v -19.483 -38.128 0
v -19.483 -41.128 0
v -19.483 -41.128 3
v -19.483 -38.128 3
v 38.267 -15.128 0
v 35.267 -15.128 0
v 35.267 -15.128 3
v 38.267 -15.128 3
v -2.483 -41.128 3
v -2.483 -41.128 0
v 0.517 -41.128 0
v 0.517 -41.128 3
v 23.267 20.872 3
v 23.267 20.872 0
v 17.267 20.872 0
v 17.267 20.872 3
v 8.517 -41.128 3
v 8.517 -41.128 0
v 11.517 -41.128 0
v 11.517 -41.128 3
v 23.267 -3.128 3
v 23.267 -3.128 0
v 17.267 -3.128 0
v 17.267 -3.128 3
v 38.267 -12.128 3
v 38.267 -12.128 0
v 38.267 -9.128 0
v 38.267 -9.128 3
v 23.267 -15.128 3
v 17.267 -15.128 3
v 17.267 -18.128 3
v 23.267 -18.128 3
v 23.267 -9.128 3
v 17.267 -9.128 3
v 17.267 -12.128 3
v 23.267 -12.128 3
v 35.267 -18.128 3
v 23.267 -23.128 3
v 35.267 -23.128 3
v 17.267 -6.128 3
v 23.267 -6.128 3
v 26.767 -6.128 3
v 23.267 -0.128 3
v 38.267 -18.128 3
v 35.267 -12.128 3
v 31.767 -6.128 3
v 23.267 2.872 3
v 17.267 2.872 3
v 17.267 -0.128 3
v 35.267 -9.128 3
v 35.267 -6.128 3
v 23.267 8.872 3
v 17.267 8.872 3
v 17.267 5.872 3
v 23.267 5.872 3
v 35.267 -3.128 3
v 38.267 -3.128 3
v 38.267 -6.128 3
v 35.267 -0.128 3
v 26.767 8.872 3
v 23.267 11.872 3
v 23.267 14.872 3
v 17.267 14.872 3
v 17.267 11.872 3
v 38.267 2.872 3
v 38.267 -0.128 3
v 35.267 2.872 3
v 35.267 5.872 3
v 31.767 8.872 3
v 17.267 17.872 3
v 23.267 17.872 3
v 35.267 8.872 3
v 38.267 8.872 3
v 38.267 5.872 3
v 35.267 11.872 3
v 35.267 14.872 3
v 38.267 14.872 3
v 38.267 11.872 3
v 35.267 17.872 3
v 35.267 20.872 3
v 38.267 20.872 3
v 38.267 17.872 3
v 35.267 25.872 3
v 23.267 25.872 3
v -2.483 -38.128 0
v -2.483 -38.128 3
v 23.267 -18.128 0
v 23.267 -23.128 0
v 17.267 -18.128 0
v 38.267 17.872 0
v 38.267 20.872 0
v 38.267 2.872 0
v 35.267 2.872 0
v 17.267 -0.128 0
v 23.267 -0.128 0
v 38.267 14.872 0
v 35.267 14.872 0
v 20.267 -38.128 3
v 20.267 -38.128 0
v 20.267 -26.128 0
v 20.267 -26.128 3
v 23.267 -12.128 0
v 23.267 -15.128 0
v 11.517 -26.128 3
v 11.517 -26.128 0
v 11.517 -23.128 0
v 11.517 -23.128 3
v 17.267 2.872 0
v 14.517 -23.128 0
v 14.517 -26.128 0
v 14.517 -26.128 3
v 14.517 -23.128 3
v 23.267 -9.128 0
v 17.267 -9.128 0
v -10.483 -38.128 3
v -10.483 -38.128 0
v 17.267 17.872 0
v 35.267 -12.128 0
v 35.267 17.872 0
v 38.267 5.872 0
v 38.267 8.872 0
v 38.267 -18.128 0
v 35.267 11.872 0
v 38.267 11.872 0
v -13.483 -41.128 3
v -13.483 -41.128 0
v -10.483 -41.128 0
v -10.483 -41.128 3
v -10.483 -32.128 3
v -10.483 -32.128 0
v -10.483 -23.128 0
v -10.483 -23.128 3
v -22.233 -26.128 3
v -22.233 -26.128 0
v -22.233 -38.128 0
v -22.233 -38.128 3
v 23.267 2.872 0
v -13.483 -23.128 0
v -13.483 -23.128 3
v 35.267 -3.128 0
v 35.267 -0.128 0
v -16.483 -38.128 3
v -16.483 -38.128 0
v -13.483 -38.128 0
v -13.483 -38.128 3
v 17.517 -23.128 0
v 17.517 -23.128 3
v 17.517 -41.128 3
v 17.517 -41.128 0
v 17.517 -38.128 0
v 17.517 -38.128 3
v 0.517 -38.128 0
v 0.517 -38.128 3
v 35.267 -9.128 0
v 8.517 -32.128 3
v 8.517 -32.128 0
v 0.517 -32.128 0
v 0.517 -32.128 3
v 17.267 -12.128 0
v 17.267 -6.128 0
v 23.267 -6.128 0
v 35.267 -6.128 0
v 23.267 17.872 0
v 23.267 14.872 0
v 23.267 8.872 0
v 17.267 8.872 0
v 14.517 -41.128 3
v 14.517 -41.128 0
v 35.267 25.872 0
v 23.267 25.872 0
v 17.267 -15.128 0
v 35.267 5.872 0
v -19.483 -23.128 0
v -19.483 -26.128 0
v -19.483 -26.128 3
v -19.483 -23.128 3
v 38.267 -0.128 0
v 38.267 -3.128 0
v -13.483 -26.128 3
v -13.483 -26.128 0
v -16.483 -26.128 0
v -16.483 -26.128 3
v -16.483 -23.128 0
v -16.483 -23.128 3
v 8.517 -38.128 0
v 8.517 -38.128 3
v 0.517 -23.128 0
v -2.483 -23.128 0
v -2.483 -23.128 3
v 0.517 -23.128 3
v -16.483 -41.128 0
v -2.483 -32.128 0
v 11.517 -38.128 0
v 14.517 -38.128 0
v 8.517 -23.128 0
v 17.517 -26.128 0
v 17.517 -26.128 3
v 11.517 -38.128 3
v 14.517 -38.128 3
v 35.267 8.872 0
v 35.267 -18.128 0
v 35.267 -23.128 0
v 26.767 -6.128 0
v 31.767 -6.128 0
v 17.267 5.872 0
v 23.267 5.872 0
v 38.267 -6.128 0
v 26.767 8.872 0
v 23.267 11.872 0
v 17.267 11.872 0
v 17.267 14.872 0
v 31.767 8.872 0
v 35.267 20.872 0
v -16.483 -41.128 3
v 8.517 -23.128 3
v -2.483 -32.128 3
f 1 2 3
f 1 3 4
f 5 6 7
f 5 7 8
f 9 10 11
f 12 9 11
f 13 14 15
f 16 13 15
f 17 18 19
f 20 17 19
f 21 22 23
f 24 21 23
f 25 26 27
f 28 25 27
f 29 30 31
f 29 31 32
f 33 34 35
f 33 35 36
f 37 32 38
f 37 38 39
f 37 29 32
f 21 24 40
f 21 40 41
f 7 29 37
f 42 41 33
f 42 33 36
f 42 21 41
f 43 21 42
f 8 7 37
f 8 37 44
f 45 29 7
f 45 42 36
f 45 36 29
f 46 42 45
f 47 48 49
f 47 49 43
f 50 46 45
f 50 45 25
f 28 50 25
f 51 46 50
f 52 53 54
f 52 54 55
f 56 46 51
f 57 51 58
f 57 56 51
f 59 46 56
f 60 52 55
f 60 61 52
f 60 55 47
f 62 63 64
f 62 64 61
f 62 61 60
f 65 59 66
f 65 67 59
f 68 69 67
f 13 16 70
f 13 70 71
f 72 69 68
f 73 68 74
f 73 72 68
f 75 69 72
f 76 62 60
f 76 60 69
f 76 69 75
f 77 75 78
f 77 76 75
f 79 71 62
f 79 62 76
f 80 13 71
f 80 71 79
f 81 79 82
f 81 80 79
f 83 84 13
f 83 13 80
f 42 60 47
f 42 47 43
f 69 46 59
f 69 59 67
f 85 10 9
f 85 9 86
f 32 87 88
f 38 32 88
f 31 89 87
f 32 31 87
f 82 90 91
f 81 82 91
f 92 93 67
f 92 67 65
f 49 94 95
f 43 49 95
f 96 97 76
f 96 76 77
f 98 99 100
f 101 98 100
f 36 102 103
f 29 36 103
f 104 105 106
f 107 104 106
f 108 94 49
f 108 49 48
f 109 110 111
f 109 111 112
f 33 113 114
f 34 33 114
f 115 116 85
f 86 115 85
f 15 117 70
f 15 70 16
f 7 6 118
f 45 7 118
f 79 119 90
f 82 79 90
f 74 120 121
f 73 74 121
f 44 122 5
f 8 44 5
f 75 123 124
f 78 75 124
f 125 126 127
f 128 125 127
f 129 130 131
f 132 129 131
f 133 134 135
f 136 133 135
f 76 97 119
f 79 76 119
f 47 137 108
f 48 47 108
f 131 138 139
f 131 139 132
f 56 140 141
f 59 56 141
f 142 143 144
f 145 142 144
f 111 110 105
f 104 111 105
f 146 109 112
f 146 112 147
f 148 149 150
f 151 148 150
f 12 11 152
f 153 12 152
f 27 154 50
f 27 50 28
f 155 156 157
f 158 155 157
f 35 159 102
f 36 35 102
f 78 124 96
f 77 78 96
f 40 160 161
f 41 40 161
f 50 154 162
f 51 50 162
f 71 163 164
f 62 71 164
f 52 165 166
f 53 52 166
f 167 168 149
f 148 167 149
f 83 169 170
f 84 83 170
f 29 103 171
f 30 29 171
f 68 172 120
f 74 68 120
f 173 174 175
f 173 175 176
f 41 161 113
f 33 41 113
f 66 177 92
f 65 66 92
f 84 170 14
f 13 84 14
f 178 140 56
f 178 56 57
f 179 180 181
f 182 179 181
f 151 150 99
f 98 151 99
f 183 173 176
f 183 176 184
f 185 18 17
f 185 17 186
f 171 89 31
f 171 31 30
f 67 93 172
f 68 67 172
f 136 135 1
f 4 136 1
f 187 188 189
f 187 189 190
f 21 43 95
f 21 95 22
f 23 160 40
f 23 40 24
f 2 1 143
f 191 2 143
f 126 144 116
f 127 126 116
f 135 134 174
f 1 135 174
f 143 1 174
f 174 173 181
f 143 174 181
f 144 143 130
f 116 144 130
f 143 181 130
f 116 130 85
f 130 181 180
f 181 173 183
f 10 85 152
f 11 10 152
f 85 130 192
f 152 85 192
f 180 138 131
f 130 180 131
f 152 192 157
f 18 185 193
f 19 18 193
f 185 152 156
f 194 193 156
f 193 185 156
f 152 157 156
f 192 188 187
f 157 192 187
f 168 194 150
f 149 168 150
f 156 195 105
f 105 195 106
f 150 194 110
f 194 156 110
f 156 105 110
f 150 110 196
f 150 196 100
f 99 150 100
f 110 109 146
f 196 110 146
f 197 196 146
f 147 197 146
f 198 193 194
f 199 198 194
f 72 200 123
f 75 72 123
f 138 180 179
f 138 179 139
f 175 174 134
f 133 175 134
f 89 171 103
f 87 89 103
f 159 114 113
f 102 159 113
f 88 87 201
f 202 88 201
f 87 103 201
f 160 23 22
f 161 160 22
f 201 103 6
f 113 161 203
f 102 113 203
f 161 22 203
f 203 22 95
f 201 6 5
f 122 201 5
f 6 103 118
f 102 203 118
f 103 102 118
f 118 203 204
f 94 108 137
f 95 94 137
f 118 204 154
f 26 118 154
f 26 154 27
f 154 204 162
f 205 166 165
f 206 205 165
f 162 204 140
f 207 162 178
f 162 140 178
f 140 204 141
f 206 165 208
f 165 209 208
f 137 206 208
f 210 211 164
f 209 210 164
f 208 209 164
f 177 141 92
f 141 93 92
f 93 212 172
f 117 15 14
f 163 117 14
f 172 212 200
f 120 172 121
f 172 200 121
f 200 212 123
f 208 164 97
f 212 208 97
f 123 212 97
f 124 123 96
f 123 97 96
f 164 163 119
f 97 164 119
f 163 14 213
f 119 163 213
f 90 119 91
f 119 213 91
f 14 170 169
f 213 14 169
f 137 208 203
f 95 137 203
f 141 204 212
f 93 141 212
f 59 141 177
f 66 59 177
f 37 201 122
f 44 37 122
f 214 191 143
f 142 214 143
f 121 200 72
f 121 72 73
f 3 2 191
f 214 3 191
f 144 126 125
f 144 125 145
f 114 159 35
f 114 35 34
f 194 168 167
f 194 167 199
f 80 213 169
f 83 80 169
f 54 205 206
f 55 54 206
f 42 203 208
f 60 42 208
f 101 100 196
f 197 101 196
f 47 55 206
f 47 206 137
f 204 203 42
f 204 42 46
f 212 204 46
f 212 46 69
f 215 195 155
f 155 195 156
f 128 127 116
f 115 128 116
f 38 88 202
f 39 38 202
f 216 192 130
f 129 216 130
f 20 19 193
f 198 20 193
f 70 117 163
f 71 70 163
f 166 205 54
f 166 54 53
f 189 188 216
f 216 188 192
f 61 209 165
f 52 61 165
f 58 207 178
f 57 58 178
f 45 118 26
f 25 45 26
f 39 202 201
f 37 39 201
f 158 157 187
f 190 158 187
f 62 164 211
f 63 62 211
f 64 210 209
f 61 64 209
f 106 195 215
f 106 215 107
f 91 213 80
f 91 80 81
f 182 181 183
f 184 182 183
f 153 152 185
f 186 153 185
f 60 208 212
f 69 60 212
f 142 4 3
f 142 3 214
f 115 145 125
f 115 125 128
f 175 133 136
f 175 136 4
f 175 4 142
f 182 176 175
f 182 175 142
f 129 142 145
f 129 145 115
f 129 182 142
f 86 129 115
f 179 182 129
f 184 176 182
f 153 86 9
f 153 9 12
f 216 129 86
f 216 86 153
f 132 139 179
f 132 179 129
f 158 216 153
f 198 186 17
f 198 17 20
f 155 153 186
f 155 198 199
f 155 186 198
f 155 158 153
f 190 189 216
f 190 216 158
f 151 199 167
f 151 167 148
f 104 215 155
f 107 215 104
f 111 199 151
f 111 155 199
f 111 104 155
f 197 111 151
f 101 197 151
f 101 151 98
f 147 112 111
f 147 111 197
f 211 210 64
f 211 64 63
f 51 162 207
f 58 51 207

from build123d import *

# Parameters (mm, degrees)
F0_W     = 3
F0_H     = 3
F1_DEPTH = 3
F2_W     = 5
F2_H     = 15
F3_DEPTH = 25


# Not quite as in the source:
# - a feature names something its author has since deleted; it is built from what else it names


with BuildPart() as f1:
    # F0 (on Top) → F1 (new body)
    with BuildSketch(Plane.XY):
        Polygon((20.2673766234, -38.1281147589), (20.2673766234, -26.1281147589), (17.5173766234, -26.1281147589), (17.5173766234, -29.1281147589), (14.5173766234, -29.1281147589), (14.5173766234, -26.1281147589), (11.5173766234, -26.1281147589), (11.5173766234, -29.1281147589), (8.5173766234, -29.1281147589), (8.5173766234, -32.1281147589), (0.5173766234, -32.1281147589), (0.5173766234, -29.1281147589), (-2.4826233766, -29.1281147589), (-2.4826233766, -32.1281147589), (-10.4826233766, -32.1281147589), (-10.4826233766, -29.1281147589), (-13.4826233766, -29.1281147589), (-13.4826233766, -26.1281147589), (-16.4826233766, -26.1281147589), (-16.4826233766, -29.1281147589), (-19.4826233766, -29.1281147589), (-19.4826233766, -26.1281147589), (-22.2326233766, -26.1281147589), (-22.2326233766, -32.1281147589), (-22.2326233766, -38.1281147589), (-19.4826233766, -38.1281147589), (-19.4826233766, -35.1281147589), (-16.4826233766, -35.1281147589), (-16.4826233766, -38.1281147589), (-13.4826233766, -38.1281147589), (-13.4826233766, -35.1281147589), (-10.4826233766, -35.1281147589), (-10.4826233766, -38.1281147589), (-2.4826233766, -38.1281147589), (-2.4826233766, -35.1281147589), (0.5173766234, -35.1281147589), (0.5173766234, -38.1281147589), (8.5173766234, -38.1281147589), (8.5173766234, -35.1281147589), (11.5173766234, -35.1281147589), (11.5173766234, -38.1281147589), (14.5173766234, -38.1281147589), (14.5173766234, -35.1281147589), (17.5173766234, -35.1281147589), (17.5173766234, -38.1281147589), align=None)
        with Locations((16.0173766234, -27.6281147589)):
            Rectangle(F0_W, F0_H)
        with Locations((16.0173766234, -24.6281147589)):
            Rectangle(F0_W, F0_H)
        with Locations((16.0173766234, -39.6281147589)):
            Rectangle(F0_W, F0_H)
        with Locations((16.0173766234, -36.6281147589)):
            Rectangle(F0_W, F0_H)
        with Locations((10.0173766234, -27.6281147589)):
            Rectangle(F0_W, F0_H)
        with Locations((10.0173766234, -24.6281147589)):
            Rectangle(F0_W, F0_H)
        with Locations((10.0173766234, -39.6281147589)):
            Rectangle(F0_W, F0_H)
        with Locations((10.0173766234, -36.6281147589)):
            Rectangle(F0_W, F0_H)
        Polygon((0.5173766234, -27.6126158823), (0.5173766234, -26.1281147589), (-2.4826233766, -26.1281147589), (-2.4826233766, -29.1281147589), (0.5173766234, -29.1281147589), align=None)
        with Locations((-0.9826233766, -24.6281147589)):
            Rectangle(F0_W, F0_H)
        with Locations((-0.9826233766, -39.6281147589)):
            Rectangle(F0_W, F0_H)
        with Locations((-0.9826233766, -36.6281147589)):
            Rectangle(F0_W, F0_H)
        with Locations((-11.9826233766, -27.6281147589)):
            Rectangle(F0_W, F0_H)
        with Locations((-11.9826233766, -24.6281147589)):
            Rectangle(F0_W, F0_H)
        with Locations((-11.9826233766, -39.6281147589)):
            Rectangle(F0_W, F0_H)
        with Locations((-11.9826233766, -36.6281147589)):
            Rectangle(F0_W, F0_H)
        with Locations((-17.9826233766, -27.6281147589)):
            Rectangle(F0_W, F0_H)
        with Locations((-17.9826233766, -24.6281147589)):
            Rectangle(F0_W, F0_H)
        with Locations((-17.9826233766, -39.6281147589)):
            Rectangle(F0_W, F0_H)
        with Locations((-17.9826233766, -36.6281147589)):
            Rectangle(F0_W, F0_H)
    extrude(amount=F1_DEPTH)


with BuildPart() as f1b:
    # F0 (on Top) → F1, piece 2 (new body)
    with BuildSketch(Plane.XY):
        with Locations((18.7673766234, -16.6281147589)):
            Rectangle(F0_W, F0_H)
        with Locations((21.7673766234, -16.6281147589)):
            Rectangle(F0_W, F0_H)
        Polygon((23.2673766234, -15.1281147589), (23.2673766234, -18.1281147589), (23.2673766234, -23.1281147589), (35.2673766234, -23.1281147589), (35.2673766234, -18.1281147589), (35.2673766234, -15.1281147589), (35.2673766234, -12.1281147589), (35.2673766234, -9.1281147589), (35.2673766234, -6.1281147589), (35.2673766234, -3.1281147589), (35.2673766234, -0.1281147589), (35.2673766234, 2.8718852411), (35.2673766234, 5.8718852411), (35.2673766234, 8.8718852411), (35.2673766234, 11.8718852411), (35.2673766234, 14.8718852411), (35.2673766234, 17.8718852411), (35.2673766234, 20.8718852411), (35.2673766234, 25.8718852411), (29.2673766234, 25.8718852411), (23.2673766234, 25.8718852411), (23.2673766234, 20.8718852411), (23.2673766234, 17.8718852411), (23.2673766234, 14.8718852411), (23.2673766234, 11.8718852411), (23.2673766234, 8.8718852411), (23.2673766234, 5.8718852411), (23.2673766234, 2.8718852411), (23.2673766234, -0.1281147589), (23.2673766234, -3.1281147589), (23.2673766234, -6.1281147589), (23.2673766234, -9.1281147589), (23.2673766234, -12.1281147589), align=None)
        with Locations((18.7673766234, -10.6281147589)):
            Rectangle(F0_W, F0_H)
        with Locations((21.7673766234, -10.6281147589)):
            Rectangle(F0_W, F0_H)
        with Locations((18.7673766234, -4.6281147589)):
            Rectangle(F0_W, F0_H)
        with Locations((21.7673766234, -4.6281147589)):
            Rectangle(F0_W, F0_H)
        with Locations((36.7673766234, -16.6281147589)):
            Rectangle(F0_W, F0_H)
        with Locations((18.7673766234, 1.3718852411)):
            Rectangle(F0_W, F0_H)
        with Locations((21.7673766234, 1.3718852411)):
            Rectangle(F0_W, F0_H)
        with Locations((36.7673766234, -10.6281147589)):
            Rectangle(F0_W, F0_H)
        with Locations((18.7673766234, 7.3718852411)):
            Rectangle(F0_W, F0_H)
        with Locations((21.7673766234, 7.3718852411)):
            Rectangle(F0_W, F0_H)
        with Locations((36.7673766234, -4.6281147589)):
            Rectangle(F0_W, F0_H)
        with Locations((18.7673766234, 13.3718852411)):
            Rectangle(F0_W, F0_H)
        with Locations((21.7673766234, 13.3718852411)):
            Rectangle(F0_W, F0_H)
        with Locations((36.7673766234, 1.3718852411)):
            Rectangle(F0_W, F0_H)
        with Locations((18.7673766234, 19.3718852411)):
            Rectangle(F0_W, F0_H)
        with Locations((21.7673766234, 19.3718852411)):
            Rectangle(F0_W, F0_H)
        with Locations((36.7673766234, 7.3718852411)):
            Rectangle(F0_W, F0_H)
        with Locations((36.7673766234, 13.3718852411)):
            Rectangle(F0_W, F0_H)
        with Locations((36.7673766234, 19.3718852411)):
            Rectangle(F0_W, F0_H)
    extrude(amount=F1_DEPTH)

    # F2 (on Top) → F3 (cut)
    with BuildSketch(Plane.XY):
        with Locations((29.2673766234, 1.3718852411)):
            Rectangle(F2_W, F2_H)
    extrude(amount=F3_DEPTH, mode=Mode.SUBTRACT)


solid = Compound([f1.part, f1b.part])
